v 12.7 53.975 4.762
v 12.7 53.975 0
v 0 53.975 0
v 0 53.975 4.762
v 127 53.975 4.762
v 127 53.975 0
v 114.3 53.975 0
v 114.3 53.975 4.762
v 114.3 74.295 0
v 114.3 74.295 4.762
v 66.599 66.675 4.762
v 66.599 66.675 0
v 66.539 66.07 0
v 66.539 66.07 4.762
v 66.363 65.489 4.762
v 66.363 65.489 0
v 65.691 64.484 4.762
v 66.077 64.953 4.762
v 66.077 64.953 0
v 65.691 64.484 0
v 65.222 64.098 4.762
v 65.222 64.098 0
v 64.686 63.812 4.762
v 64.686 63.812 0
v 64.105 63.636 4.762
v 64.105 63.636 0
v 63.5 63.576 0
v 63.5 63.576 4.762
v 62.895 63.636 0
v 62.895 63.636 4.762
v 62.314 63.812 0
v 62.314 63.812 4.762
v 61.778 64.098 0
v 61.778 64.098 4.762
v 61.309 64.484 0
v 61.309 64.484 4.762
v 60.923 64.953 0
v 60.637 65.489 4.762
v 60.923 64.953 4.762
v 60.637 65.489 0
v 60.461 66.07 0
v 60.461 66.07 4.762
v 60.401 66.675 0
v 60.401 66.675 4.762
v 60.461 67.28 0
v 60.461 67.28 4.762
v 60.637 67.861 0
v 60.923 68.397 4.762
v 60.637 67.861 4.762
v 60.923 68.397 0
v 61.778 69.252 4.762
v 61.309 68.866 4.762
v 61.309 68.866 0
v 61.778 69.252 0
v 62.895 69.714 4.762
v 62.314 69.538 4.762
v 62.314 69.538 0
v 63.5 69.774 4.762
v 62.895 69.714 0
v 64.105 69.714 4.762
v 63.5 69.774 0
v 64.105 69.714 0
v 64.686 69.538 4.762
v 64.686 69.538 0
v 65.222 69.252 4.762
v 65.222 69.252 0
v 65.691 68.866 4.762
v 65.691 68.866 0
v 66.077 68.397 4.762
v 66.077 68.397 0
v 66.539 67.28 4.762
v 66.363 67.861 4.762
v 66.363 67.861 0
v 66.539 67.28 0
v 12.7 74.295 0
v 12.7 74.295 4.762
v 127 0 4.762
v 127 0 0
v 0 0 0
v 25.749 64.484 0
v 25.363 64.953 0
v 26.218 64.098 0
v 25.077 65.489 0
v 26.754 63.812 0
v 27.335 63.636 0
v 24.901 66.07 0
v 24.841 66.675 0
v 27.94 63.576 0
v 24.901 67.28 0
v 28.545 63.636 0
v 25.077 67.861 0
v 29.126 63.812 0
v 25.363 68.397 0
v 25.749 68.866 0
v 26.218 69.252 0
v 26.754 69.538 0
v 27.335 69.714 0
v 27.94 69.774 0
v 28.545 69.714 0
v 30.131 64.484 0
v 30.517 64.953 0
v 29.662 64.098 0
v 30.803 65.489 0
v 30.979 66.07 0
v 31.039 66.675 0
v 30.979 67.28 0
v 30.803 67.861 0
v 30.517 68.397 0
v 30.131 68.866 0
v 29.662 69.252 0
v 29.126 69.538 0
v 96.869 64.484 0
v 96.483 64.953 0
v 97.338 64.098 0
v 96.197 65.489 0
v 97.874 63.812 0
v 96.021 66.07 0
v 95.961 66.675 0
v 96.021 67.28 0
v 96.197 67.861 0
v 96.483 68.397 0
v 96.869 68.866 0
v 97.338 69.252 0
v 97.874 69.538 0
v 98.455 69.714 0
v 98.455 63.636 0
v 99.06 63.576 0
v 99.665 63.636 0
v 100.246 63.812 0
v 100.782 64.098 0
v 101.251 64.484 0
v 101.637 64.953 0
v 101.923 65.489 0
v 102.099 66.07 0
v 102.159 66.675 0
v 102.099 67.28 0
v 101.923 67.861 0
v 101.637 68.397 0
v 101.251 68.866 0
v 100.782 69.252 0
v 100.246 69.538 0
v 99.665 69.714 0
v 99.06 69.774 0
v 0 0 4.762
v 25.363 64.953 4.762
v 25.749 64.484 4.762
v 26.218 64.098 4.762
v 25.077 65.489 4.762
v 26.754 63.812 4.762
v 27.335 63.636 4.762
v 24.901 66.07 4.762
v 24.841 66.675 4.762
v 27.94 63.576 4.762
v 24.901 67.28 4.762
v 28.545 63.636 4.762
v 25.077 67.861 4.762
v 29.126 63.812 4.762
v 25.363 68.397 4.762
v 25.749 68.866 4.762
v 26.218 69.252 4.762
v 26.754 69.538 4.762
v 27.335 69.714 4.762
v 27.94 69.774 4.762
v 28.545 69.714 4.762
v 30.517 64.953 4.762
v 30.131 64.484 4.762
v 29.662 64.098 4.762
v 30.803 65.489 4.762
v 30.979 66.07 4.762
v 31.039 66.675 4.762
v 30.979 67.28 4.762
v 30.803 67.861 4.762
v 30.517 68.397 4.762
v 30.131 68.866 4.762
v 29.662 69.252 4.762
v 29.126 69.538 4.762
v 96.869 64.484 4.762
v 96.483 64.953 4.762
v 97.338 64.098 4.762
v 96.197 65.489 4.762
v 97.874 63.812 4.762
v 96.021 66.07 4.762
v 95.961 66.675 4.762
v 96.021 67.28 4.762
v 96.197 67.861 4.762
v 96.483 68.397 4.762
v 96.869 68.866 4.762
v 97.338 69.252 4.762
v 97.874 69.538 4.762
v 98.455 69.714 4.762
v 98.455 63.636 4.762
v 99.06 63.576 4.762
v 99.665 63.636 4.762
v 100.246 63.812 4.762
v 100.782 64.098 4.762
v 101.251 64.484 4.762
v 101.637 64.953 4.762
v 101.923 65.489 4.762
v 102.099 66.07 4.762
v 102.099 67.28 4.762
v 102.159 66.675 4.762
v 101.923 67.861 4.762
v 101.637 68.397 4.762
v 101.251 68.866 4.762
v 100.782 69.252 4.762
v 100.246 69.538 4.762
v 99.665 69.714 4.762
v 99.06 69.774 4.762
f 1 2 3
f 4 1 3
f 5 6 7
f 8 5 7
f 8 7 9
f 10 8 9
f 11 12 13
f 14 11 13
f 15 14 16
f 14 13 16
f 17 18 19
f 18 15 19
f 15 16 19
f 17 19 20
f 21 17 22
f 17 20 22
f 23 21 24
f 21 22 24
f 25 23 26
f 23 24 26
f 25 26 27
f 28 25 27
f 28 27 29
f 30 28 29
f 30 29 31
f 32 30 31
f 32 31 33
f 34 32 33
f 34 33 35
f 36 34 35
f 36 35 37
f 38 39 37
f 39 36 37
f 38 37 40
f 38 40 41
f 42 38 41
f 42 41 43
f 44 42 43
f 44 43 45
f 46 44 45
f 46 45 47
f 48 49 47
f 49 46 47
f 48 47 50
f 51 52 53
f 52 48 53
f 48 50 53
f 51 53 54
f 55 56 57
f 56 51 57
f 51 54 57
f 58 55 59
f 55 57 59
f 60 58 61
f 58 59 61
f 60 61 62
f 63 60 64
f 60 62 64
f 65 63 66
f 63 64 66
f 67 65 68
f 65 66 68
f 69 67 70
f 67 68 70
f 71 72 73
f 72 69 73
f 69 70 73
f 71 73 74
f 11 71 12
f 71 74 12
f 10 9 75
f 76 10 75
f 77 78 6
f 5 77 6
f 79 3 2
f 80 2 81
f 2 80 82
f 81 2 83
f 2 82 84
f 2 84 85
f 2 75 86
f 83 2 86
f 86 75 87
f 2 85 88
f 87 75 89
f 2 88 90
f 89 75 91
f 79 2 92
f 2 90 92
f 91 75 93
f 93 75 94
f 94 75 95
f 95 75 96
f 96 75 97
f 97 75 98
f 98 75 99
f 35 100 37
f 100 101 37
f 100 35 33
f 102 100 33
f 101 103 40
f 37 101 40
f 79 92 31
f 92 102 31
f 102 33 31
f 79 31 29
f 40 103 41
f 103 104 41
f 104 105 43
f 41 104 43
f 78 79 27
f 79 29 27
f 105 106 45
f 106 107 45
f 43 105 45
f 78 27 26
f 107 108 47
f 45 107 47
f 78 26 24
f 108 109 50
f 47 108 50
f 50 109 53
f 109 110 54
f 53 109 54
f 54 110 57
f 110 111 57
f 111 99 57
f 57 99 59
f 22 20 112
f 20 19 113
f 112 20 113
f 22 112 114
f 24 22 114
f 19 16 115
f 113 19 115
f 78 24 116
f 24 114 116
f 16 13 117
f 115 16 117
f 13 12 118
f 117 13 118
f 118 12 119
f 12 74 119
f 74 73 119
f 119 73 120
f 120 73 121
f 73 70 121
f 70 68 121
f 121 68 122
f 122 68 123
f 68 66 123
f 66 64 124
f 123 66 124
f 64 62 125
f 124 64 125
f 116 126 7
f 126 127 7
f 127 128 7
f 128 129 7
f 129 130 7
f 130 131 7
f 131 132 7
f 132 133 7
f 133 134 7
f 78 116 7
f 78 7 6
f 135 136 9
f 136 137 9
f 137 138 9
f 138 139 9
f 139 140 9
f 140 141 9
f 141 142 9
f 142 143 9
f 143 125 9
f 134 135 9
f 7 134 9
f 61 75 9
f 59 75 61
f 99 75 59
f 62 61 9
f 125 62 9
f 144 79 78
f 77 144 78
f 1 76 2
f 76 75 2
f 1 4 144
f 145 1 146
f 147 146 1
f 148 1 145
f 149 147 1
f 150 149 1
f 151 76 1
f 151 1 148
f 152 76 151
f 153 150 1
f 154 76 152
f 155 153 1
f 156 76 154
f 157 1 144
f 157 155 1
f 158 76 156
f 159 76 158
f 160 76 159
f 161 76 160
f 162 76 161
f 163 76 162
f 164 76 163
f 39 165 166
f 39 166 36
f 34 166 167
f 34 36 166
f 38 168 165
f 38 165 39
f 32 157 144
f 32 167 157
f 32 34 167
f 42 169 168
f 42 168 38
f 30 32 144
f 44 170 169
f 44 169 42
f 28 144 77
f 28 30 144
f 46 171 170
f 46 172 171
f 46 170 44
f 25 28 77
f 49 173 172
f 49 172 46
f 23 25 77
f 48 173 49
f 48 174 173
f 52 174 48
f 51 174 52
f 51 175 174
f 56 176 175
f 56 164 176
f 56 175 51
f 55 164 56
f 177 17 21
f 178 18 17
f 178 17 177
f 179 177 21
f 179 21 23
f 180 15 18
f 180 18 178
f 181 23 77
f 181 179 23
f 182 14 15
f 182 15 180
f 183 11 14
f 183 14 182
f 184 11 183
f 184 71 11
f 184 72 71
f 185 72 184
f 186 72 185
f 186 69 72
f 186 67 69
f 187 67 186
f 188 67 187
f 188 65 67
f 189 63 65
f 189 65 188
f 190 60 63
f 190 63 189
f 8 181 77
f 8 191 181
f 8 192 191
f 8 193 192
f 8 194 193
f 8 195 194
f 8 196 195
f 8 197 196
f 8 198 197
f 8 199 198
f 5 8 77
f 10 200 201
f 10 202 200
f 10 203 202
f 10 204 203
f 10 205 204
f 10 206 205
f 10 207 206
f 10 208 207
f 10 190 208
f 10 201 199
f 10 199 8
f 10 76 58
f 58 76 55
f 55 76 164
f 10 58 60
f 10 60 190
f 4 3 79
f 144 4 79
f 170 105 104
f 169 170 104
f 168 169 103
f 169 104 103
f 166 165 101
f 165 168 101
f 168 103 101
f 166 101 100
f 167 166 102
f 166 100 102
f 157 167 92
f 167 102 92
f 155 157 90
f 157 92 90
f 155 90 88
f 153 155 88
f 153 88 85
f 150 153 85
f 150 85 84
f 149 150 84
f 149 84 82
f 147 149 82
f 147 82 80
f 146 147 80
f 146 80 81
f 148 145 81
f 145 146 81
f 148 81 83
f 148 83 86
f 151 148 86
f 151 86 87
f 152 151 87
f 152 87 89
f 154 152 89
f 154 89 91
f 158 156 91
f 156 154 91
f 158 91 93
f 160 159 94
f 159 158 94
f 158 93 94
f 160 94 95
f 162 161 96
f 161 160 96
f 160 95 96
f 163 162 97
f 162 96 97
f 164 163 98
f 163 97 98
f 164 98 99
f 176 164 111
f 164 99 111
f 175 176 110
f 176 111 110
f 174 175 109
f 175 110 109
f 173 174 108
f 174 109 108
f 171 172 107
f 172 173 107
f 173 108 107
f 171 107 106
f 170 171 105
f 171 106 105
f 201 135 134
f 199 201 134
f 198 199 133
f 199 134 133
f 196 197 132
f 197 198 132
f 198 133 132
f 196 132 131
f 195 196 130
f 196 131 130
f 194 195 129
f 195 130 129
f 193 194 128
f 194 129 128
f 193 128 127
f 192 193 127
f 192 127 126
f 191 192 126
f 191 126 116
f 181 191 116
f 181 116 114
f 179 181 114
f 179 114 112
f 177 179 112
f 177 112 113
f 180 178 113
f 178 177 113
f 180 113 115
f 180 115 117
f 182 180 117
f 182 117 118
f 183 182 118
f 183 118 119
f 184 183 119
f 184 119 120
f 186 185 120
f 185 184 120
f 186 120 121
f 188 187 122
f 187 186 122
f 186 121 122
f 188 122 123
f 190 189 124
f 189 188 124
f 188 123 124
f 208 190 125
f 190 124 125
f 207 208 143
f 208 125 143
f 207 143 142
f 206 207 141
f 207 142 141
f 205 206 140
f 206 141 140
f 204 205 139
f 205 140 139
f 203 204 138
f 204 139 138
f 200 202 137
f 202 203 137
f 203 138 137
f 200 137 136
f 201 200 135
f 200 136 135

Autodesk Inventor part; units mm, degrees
ref_plane "YZ Plane" through (0, 0, 0) normal (1, 0, 0) x (0, 1, 0)
ref_plane "XZ Plane" through (0, 0, 0) normal (0, 1, 0) x (-1, 0, 0)
ref_plane "XY Plane" through (0, 0, 0) normal (0, 0, 1) x (1, 0, 0)
sketch "Sketch1" plane through (0, 0, 0) normal (0, 0, 1) x (1, 0, 0)
  line L0 (0, 0) -> (127, 0)
  line L1 (127, 0) -> (127, 53.975)
  line L2 (127, 53.975) -> (0, 53.975)
  line L3 (0, 53.975) -> (0, 0)
  line L4 (12.7, 53.975) -> (114.3, 53.975)
  line L5 (114.3, 53.975) -> (114.3, 74.295)
  line L6 (114.3, 74.295) -> (12.7, 74.295)
  line L7 (12.7, 74.295) -> (12.7, 53.975)
  circle A0 centre (27.94, 66.675) radius 3.0988
  circle A1 centre (63.5, 66.675) radius 3.0988
  circle A2 centre (99.06, 66.675) radius 3.0988
  dimension "d0" = 127
  dimension "d1" = 53.975
  dimension "d2" = 101.6
  dimension "d3" = 12.7
  dimension "d4" = 20.32
  dimension "d5" = 6.1976
  dimension "d6" = 35.56
  dimension "d12" = 12.7
  dimension "d13" = 12.7
  dimension "d14" = 50.8
  dimension "d15" = 12.7
  dimension "d16" = 35.56
extrude "Extrusion1" add sketch "Sketch1" along normal blind 4.7625
equation "\"d3\" = -0.5 * d2 + 0.5 * d0"
equation "\"d13\" = d12"
equation "\"d14\" = 0.5 * d2"
equation "\"d15\" = d13"
equation "\"d16\" = d6"
properties part number "Top"
